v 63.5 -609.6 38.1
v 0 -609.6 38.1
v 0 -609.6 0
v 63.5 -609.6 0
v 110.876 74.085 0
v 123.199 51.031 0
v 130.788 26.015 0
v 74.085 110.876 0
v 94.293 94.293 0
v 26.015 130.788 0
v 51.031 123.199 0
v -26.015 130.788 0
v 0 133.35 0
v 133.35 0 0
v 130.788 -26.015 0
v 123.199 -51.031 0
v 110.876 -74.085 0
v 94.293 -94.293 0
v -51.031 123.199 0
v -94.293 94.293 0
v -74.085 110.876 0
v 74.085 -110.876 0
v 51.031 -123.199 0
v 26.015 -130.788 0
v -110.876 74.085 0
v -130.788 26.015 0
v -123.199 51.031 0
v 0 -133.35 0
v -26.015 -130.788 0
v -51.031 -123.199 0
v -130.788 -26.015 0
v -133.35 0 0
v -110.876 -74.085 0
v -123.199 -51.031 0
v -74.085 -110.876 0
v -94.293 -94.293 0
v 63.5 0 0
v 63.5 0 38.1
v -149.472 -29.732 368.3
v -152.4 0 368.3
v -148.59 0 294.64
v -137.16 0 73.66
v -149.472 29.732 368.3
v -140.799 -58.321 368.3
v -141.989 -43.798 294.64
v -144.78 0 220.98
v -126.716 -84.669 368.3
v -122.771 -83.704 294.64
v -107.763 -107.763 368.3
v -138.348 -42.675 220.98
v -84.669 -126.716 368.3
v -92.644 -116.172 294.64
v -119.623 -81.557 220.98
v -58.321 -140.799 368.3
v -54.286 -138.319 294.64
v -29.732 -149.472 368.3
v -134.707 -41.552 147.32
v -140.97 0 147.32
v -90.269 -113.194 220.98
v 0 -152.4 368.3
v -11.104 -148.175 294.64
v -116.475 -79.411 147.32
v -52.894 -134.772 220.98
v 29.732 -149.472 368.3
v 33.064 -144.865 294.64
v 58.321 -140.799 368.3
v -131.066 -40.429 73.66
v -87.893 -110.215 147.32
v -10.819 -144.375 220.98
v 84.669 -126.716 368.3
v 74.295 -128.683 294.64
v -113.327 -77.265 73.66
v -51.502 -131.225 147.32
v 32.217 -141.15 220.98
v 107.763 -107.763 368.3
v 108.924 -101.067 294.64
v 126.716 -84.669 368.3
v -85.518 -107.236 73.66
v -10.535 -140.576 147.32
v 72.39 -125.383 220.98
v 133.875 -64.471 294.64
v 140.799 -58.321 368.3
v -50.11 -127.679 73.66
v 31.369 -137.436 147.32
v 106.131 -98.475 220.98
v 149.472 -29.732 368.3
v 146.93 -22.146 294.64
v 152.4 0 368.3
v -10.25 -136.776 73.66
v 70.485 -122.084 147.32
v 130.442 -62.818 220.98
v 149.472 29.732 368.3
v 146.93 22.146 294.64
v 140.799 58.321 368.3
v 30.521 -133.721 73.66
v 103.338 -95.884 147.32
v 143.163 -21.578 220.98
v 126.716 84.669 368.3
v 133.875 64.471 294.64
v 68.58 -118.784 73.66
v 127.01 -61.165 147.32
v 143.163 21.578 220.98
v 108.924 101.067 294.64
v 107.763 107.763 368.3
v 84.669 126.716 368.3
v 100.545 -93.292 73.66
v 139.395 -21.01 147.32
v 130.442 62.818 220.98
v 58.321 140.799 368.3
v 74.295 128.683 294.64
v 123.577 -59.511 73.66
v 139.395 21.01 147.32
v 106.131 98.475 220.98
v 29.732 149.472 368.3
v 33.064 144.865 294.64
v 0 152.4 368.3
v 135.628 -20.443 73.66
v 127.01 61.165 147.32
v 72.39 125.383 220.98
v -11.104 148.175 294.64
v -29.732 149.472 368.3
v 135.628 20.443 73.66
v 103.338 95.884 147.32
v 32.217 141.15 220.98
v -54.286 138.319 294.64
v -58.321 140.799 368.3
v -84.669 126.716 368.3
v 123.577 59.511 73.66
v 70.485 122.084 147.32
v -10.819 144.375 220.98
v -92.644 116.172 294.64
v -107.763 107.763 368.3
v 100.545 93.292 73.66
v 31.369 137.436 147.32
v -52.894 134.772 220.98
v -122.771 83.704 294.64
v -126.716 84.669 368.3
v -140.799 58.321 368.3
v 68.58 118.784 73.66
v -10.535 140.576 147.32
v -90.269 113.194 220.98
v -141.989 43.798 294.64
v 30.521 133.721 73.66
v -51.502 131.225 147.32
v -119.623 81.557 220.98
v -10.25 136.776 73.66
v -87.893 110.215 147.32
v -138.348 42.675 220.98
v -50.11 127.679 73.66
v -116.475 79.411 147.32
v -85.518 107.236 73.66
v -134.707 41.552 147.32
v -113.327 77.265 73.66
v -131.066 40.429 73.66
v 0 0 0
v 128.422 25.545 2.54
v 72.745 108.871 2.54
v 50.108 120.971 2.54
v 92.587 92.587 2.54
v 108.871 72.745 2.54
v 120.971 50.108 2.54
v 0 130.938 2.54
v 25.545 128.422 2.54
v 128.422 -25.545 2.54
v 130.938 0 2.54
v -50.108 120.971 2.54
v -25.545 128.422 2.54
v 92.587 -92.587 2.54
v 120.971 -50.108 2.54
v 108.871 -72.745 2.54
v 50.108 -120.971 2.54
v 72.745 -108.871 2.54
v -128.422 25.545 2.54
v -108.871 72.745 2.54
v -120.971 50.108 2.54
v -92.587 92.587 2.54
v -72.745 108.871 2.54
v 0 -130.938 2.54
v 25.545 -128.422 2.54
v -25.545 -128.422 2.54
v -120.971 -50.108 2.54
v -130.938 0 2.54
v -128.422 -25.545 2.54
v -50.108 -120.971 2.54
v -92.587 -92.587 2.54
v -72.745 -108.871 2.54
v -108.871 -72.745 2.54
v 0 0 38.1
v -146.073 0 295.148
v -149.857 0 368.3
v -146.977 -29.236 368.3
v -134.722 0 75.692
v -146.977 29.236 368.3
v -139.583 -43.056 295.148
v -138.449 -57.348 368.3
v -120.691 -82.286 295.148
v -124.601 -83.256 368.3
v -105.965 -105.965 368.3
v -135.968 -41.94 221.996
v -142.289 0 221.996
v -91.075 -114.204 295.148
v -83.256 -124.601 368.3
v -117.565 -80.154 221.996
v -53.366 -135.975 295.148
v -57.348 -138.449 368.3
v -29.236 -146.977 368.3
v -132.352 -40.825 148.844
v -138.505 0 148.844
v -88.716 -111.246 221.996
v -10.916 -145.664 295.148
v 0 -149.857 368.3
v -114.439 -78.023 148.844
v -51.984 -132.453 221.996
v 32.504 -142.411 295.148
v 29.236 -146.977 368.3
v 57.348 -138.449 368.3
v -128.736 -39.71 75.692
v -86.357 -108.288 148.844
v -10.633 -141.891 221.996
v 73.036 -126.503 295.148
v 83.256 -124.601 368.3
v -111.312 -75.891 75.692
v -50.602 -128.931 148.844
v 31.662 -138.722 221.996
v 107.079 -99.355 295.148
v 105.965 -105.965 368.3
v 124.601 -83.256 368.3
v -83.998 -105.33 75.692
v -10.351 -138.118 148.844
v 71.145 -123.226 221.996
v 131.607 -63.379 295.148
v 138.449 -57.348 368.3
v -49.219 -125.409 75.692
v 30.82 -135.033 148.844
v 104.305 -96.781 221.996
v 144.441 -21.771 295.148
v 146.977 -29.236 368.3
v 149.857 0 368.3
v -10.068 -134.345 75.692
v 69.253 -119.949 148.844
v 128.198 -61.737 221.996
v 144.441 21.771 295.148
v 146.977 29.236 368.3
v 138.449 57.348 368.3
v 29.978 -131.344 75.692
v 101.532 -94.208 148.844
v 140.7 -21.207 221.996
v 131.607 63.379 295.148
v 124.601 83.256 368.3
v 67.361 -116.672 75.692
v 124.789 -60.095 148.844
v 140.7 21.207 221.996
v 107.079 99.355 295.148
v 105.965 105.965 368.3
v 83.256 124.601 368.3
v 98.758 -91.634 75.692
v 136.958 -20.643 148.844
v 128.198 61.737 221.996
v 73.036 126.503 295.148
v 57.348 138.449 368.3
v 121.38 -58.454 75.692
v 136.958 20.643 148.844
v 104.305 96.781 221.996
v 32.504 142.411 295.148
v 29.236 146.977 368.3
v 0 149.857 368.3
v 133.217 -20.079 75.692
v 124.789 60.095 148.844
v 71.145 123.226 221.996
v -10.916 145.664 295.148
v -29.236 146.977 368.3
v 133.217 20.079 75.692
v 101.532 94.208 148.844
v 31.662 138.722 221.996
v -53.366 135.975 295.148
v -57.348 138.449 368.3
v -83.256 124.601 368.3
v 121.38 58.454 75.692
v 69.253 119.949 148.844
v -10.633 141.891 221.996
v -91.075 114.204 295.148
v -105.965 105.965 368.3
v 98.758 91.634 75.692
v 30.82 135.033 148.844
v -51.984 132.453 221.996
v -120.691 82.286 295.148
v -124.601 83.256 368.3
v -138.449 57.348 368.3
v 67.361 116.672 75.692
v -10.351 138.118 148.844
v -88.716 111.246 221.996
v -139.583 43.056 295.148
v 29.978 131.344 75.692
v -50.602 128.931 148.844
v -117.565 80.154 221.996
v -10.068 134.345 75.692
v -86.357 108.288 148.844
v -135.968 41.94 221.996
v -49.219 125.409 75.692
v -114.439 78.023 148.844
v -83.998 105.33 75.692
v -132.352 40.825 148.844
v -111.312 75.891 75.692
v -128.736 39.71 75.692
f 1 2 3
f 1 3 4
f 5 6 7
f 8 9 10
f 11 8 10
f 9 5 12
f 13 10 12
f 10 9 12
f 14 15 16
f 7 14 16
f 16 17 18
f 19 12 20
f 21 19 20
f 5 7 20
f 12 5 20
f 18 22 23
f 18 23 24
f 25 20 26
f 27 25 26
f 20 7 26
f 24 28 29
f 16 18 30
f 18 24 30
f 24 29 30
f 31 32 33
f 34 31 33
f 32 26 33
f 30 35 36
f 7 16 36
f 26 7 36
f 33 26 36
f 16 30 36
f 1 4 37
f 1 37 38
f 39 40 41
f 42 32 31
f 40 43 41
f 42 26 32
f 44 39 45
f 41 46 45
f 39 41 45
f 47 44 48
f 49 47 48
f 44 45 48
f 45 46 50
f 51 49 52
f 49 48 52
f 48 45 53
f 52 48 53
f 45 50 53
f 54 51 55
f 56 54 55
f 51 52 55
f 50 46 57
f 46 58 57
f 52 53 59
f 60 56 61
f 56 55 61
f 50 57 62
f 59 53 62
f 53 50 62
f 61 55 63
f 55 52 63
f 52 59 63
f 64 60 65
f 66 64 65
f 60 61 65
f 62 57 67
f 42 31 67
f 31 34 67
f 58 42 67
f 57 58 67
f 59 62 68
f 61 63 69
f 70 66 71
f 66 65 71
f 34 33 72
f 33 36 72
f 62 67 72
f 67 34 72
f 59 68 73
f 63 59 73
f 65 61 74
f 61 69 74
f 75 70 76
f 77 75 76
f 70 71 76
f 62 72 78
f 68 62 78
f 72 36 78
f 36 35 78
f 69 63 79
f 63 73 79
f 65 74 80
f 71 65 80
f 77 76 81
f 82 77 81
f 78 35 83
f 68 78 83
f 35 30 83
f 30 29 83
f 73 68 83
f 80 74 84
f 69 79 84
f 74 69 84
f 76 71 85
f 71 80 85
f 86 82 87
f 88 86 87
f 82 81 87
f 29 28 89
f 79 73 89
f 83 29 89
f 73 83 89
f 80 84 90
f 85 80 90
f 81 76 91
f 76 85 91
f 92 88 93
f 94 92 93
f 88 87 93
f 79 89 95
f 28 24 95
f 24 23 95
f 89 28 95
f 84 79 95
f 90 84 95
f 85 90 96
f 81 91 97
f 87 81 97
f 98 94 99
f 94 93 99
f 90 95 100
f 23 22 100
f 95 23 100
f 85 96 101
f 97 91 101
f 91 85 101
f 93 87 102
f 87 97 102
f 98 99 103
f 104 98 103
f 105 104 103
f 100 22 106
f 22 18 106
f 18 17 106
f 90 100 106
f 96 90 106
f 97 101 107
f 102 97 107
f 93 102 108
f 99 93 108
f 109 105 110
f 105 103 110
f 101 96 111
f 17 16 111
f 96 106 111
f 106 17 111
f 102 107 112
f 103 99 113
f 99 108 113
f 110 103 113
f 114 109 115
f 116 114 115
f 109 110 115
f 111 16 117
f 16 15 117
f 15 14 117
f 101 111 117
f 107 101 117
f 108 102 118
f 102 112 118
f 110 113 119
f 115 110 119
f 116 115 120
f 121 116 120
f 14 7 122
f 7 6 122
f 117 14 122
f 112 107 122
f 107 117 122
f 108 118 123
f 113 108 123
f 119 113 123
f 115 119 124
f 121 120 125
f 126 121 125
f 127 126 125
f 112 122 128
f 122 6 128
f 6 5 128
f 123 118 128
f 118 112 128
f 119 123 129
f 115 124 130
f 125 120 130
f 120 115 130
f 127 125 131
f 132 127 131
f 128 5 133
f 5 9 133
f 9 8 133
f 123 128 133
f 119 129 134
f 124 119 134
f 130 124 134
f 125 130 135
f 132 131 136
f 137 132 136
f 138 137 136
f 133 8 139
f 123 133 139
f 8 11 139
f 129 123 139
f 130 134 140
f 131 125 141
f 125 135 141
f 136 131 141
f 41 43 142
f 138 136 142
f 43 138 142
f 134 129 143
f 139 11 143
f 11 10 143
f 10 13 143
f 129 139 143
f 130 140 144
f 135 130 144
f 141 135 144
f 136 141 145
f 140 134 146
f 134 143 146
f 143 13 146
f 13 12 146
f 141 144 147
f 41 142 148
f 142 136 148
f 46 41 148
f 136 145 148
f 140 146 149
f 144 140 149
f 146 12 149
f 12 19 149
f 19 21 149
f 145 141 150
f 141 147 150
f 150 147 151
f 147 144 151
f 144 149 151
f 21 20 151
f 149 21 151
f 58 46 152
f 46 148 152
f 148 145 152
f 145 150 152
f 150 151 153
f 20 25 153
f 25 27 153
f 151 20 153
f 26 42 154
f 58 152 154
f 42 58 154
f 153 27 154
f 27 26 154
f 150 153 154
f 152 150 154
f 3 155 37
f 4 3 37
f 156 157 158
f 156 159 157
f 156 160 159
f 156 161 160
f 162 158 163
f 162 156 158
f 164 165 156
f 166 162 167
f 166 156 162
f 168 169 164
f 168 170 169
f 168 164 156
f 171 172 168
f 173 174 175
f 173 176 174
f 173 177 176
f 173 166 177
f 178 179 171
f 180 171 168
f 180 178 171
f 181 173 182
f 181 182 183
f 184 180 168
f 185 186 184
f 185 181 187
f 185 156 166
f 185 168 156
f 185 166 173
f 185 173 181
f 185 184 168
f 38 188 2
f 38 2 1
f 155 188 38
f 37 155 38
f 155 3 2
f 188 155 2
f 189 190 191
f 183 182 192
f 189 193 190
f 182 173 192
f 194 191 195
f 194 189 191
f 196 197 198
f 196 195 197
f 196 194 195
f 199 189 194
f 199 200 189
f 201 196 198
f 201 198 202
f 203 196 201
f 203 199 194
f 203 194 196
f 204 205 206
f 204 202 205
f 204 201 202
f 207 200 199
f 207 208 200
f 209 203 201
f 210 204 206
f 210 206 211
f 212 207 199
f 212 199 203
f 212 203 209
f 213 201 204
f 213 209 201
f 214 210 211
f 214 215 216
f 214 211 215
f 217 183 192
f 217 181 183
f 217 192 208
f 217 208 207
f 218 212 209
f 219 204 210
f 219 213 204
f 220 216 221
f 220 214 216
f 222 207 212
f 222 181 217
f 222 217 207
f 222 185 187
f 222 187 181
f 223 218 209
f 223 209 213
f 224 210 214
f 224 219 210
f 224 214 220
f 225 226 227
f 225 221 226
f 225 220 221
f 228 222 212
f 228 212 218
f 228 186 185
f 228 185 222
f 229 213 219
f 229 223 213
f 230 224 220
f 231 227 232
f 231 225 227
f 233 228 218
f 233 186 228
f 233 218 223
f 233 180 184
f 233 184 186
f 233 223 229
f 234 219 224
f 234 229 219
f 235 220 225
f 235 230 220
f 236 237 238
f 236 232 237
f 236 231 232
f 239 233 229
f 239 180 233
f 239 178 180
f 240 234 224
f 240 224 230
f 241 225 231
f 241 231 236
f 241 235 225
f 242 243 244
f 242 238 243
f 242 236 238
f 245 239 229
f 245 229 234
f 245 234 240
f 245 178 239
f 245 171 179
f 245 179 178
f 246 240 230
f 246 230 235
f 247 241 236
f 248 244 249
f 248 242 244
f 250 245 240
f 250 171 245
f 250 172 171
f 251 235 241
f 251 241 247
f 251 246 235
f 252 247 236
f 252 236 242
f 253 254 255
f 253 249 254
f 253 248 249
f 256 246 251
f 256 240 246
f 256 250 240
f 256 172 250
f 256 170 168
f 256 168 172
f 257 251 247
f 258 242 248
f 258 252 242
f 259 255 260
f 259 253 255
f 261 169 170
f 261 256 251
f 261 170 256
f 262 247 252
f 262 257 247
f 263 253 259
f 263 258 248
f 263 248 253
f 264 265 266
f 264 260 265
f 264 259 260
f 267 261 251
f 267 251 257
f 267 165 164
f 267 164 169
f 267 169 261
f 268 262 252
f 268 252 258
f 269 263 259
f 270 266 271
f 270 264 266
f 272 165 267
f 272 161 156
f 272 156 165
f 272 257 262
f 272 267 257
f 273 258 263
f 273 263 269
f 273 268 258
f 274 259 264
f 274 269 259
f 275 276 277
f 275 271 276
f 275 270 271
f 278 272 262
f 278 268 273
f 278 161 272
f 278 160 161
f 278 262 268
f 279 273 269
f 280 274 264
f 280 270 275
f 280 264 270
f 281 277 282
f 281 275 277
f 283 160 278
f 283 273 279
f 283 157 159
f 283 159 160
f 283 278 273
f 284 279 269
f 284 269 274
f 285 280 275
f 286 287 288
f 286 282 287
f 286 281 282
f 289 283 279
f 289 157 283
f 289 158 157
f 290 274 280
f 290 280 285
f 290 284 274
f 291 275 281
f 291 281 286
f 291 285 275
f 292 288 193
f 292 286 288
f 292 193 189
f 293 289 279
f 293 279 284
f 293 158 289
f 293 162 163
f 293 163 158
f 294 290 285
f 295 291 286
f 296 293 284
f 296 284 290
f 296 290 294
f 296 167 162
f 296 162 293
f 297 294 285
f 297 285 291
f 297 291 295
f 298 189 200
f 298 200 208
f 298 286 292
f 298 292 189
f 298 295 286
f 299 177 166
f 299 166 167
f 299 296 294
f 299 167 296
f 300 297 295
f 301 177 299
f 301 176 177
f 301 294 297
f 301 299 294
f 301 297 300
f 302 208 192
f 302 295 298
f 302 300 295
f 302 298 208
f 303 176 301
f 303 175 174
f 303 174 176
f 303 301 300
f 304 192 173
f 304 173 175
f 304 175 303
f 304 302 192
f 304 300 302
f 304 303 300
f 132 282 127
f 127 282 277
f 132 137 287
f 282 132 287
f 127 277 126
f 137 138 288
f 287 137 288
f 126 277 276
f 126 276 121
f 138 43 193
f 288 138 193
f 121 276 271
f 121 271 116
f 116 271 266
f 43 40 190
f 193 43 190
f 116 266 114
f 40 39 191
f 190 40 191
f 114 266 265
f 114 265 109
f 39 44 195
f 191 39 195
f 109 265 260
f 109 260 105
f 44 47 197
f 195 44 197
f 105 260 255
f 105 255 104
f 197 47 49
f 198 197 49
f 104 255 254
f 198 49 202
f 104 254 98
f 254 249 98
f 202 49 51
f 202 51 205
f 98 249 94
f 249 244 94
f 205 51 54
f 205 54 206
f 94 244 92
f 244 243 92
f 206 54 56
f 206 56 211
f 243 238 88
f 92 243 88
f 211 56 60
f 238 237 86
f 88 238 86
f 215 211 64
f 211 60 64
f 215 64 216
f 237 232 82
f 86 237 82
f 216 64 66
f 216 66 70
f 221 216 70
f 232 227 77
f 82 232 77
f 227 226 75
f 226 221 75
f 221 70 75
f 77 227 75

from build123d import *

# Parameters (mm, degrees)
F2_T     = -2.54
F3_W     = 63.5
F3_H     = 38.1
F4_DEPTH = 609.6


with BuildPart() as f1:
    # F0 (on Front) → F1 (revolve)
    with BuildSketch(Plane.XZ):
        Polygon((-133.35, 0), (0, 0), (0, 368.3), (-152.4, 368.3), align=None)
    revolve(axis=Axis((0, 0, 184.15), (0, 0, 1)))

    # F2
    f2_openings = [f1.faces().sort_by_distance(p)[0] for p in [
        (0, 0, 368.3),
    ]]
    offset(amount=F2_T, openings=f2_openings)


with BuildPart() as f4:
    # F3 (on Front) → F4 (new body)
    with BuildSketch(Plane.XZ):
        with Locations((31.75, 19.05)):
            Rectangle(F3_W, F3_H)
    extrude(amount=F4_DEPTH)


solid = Compound([f1.part, f4.part])
